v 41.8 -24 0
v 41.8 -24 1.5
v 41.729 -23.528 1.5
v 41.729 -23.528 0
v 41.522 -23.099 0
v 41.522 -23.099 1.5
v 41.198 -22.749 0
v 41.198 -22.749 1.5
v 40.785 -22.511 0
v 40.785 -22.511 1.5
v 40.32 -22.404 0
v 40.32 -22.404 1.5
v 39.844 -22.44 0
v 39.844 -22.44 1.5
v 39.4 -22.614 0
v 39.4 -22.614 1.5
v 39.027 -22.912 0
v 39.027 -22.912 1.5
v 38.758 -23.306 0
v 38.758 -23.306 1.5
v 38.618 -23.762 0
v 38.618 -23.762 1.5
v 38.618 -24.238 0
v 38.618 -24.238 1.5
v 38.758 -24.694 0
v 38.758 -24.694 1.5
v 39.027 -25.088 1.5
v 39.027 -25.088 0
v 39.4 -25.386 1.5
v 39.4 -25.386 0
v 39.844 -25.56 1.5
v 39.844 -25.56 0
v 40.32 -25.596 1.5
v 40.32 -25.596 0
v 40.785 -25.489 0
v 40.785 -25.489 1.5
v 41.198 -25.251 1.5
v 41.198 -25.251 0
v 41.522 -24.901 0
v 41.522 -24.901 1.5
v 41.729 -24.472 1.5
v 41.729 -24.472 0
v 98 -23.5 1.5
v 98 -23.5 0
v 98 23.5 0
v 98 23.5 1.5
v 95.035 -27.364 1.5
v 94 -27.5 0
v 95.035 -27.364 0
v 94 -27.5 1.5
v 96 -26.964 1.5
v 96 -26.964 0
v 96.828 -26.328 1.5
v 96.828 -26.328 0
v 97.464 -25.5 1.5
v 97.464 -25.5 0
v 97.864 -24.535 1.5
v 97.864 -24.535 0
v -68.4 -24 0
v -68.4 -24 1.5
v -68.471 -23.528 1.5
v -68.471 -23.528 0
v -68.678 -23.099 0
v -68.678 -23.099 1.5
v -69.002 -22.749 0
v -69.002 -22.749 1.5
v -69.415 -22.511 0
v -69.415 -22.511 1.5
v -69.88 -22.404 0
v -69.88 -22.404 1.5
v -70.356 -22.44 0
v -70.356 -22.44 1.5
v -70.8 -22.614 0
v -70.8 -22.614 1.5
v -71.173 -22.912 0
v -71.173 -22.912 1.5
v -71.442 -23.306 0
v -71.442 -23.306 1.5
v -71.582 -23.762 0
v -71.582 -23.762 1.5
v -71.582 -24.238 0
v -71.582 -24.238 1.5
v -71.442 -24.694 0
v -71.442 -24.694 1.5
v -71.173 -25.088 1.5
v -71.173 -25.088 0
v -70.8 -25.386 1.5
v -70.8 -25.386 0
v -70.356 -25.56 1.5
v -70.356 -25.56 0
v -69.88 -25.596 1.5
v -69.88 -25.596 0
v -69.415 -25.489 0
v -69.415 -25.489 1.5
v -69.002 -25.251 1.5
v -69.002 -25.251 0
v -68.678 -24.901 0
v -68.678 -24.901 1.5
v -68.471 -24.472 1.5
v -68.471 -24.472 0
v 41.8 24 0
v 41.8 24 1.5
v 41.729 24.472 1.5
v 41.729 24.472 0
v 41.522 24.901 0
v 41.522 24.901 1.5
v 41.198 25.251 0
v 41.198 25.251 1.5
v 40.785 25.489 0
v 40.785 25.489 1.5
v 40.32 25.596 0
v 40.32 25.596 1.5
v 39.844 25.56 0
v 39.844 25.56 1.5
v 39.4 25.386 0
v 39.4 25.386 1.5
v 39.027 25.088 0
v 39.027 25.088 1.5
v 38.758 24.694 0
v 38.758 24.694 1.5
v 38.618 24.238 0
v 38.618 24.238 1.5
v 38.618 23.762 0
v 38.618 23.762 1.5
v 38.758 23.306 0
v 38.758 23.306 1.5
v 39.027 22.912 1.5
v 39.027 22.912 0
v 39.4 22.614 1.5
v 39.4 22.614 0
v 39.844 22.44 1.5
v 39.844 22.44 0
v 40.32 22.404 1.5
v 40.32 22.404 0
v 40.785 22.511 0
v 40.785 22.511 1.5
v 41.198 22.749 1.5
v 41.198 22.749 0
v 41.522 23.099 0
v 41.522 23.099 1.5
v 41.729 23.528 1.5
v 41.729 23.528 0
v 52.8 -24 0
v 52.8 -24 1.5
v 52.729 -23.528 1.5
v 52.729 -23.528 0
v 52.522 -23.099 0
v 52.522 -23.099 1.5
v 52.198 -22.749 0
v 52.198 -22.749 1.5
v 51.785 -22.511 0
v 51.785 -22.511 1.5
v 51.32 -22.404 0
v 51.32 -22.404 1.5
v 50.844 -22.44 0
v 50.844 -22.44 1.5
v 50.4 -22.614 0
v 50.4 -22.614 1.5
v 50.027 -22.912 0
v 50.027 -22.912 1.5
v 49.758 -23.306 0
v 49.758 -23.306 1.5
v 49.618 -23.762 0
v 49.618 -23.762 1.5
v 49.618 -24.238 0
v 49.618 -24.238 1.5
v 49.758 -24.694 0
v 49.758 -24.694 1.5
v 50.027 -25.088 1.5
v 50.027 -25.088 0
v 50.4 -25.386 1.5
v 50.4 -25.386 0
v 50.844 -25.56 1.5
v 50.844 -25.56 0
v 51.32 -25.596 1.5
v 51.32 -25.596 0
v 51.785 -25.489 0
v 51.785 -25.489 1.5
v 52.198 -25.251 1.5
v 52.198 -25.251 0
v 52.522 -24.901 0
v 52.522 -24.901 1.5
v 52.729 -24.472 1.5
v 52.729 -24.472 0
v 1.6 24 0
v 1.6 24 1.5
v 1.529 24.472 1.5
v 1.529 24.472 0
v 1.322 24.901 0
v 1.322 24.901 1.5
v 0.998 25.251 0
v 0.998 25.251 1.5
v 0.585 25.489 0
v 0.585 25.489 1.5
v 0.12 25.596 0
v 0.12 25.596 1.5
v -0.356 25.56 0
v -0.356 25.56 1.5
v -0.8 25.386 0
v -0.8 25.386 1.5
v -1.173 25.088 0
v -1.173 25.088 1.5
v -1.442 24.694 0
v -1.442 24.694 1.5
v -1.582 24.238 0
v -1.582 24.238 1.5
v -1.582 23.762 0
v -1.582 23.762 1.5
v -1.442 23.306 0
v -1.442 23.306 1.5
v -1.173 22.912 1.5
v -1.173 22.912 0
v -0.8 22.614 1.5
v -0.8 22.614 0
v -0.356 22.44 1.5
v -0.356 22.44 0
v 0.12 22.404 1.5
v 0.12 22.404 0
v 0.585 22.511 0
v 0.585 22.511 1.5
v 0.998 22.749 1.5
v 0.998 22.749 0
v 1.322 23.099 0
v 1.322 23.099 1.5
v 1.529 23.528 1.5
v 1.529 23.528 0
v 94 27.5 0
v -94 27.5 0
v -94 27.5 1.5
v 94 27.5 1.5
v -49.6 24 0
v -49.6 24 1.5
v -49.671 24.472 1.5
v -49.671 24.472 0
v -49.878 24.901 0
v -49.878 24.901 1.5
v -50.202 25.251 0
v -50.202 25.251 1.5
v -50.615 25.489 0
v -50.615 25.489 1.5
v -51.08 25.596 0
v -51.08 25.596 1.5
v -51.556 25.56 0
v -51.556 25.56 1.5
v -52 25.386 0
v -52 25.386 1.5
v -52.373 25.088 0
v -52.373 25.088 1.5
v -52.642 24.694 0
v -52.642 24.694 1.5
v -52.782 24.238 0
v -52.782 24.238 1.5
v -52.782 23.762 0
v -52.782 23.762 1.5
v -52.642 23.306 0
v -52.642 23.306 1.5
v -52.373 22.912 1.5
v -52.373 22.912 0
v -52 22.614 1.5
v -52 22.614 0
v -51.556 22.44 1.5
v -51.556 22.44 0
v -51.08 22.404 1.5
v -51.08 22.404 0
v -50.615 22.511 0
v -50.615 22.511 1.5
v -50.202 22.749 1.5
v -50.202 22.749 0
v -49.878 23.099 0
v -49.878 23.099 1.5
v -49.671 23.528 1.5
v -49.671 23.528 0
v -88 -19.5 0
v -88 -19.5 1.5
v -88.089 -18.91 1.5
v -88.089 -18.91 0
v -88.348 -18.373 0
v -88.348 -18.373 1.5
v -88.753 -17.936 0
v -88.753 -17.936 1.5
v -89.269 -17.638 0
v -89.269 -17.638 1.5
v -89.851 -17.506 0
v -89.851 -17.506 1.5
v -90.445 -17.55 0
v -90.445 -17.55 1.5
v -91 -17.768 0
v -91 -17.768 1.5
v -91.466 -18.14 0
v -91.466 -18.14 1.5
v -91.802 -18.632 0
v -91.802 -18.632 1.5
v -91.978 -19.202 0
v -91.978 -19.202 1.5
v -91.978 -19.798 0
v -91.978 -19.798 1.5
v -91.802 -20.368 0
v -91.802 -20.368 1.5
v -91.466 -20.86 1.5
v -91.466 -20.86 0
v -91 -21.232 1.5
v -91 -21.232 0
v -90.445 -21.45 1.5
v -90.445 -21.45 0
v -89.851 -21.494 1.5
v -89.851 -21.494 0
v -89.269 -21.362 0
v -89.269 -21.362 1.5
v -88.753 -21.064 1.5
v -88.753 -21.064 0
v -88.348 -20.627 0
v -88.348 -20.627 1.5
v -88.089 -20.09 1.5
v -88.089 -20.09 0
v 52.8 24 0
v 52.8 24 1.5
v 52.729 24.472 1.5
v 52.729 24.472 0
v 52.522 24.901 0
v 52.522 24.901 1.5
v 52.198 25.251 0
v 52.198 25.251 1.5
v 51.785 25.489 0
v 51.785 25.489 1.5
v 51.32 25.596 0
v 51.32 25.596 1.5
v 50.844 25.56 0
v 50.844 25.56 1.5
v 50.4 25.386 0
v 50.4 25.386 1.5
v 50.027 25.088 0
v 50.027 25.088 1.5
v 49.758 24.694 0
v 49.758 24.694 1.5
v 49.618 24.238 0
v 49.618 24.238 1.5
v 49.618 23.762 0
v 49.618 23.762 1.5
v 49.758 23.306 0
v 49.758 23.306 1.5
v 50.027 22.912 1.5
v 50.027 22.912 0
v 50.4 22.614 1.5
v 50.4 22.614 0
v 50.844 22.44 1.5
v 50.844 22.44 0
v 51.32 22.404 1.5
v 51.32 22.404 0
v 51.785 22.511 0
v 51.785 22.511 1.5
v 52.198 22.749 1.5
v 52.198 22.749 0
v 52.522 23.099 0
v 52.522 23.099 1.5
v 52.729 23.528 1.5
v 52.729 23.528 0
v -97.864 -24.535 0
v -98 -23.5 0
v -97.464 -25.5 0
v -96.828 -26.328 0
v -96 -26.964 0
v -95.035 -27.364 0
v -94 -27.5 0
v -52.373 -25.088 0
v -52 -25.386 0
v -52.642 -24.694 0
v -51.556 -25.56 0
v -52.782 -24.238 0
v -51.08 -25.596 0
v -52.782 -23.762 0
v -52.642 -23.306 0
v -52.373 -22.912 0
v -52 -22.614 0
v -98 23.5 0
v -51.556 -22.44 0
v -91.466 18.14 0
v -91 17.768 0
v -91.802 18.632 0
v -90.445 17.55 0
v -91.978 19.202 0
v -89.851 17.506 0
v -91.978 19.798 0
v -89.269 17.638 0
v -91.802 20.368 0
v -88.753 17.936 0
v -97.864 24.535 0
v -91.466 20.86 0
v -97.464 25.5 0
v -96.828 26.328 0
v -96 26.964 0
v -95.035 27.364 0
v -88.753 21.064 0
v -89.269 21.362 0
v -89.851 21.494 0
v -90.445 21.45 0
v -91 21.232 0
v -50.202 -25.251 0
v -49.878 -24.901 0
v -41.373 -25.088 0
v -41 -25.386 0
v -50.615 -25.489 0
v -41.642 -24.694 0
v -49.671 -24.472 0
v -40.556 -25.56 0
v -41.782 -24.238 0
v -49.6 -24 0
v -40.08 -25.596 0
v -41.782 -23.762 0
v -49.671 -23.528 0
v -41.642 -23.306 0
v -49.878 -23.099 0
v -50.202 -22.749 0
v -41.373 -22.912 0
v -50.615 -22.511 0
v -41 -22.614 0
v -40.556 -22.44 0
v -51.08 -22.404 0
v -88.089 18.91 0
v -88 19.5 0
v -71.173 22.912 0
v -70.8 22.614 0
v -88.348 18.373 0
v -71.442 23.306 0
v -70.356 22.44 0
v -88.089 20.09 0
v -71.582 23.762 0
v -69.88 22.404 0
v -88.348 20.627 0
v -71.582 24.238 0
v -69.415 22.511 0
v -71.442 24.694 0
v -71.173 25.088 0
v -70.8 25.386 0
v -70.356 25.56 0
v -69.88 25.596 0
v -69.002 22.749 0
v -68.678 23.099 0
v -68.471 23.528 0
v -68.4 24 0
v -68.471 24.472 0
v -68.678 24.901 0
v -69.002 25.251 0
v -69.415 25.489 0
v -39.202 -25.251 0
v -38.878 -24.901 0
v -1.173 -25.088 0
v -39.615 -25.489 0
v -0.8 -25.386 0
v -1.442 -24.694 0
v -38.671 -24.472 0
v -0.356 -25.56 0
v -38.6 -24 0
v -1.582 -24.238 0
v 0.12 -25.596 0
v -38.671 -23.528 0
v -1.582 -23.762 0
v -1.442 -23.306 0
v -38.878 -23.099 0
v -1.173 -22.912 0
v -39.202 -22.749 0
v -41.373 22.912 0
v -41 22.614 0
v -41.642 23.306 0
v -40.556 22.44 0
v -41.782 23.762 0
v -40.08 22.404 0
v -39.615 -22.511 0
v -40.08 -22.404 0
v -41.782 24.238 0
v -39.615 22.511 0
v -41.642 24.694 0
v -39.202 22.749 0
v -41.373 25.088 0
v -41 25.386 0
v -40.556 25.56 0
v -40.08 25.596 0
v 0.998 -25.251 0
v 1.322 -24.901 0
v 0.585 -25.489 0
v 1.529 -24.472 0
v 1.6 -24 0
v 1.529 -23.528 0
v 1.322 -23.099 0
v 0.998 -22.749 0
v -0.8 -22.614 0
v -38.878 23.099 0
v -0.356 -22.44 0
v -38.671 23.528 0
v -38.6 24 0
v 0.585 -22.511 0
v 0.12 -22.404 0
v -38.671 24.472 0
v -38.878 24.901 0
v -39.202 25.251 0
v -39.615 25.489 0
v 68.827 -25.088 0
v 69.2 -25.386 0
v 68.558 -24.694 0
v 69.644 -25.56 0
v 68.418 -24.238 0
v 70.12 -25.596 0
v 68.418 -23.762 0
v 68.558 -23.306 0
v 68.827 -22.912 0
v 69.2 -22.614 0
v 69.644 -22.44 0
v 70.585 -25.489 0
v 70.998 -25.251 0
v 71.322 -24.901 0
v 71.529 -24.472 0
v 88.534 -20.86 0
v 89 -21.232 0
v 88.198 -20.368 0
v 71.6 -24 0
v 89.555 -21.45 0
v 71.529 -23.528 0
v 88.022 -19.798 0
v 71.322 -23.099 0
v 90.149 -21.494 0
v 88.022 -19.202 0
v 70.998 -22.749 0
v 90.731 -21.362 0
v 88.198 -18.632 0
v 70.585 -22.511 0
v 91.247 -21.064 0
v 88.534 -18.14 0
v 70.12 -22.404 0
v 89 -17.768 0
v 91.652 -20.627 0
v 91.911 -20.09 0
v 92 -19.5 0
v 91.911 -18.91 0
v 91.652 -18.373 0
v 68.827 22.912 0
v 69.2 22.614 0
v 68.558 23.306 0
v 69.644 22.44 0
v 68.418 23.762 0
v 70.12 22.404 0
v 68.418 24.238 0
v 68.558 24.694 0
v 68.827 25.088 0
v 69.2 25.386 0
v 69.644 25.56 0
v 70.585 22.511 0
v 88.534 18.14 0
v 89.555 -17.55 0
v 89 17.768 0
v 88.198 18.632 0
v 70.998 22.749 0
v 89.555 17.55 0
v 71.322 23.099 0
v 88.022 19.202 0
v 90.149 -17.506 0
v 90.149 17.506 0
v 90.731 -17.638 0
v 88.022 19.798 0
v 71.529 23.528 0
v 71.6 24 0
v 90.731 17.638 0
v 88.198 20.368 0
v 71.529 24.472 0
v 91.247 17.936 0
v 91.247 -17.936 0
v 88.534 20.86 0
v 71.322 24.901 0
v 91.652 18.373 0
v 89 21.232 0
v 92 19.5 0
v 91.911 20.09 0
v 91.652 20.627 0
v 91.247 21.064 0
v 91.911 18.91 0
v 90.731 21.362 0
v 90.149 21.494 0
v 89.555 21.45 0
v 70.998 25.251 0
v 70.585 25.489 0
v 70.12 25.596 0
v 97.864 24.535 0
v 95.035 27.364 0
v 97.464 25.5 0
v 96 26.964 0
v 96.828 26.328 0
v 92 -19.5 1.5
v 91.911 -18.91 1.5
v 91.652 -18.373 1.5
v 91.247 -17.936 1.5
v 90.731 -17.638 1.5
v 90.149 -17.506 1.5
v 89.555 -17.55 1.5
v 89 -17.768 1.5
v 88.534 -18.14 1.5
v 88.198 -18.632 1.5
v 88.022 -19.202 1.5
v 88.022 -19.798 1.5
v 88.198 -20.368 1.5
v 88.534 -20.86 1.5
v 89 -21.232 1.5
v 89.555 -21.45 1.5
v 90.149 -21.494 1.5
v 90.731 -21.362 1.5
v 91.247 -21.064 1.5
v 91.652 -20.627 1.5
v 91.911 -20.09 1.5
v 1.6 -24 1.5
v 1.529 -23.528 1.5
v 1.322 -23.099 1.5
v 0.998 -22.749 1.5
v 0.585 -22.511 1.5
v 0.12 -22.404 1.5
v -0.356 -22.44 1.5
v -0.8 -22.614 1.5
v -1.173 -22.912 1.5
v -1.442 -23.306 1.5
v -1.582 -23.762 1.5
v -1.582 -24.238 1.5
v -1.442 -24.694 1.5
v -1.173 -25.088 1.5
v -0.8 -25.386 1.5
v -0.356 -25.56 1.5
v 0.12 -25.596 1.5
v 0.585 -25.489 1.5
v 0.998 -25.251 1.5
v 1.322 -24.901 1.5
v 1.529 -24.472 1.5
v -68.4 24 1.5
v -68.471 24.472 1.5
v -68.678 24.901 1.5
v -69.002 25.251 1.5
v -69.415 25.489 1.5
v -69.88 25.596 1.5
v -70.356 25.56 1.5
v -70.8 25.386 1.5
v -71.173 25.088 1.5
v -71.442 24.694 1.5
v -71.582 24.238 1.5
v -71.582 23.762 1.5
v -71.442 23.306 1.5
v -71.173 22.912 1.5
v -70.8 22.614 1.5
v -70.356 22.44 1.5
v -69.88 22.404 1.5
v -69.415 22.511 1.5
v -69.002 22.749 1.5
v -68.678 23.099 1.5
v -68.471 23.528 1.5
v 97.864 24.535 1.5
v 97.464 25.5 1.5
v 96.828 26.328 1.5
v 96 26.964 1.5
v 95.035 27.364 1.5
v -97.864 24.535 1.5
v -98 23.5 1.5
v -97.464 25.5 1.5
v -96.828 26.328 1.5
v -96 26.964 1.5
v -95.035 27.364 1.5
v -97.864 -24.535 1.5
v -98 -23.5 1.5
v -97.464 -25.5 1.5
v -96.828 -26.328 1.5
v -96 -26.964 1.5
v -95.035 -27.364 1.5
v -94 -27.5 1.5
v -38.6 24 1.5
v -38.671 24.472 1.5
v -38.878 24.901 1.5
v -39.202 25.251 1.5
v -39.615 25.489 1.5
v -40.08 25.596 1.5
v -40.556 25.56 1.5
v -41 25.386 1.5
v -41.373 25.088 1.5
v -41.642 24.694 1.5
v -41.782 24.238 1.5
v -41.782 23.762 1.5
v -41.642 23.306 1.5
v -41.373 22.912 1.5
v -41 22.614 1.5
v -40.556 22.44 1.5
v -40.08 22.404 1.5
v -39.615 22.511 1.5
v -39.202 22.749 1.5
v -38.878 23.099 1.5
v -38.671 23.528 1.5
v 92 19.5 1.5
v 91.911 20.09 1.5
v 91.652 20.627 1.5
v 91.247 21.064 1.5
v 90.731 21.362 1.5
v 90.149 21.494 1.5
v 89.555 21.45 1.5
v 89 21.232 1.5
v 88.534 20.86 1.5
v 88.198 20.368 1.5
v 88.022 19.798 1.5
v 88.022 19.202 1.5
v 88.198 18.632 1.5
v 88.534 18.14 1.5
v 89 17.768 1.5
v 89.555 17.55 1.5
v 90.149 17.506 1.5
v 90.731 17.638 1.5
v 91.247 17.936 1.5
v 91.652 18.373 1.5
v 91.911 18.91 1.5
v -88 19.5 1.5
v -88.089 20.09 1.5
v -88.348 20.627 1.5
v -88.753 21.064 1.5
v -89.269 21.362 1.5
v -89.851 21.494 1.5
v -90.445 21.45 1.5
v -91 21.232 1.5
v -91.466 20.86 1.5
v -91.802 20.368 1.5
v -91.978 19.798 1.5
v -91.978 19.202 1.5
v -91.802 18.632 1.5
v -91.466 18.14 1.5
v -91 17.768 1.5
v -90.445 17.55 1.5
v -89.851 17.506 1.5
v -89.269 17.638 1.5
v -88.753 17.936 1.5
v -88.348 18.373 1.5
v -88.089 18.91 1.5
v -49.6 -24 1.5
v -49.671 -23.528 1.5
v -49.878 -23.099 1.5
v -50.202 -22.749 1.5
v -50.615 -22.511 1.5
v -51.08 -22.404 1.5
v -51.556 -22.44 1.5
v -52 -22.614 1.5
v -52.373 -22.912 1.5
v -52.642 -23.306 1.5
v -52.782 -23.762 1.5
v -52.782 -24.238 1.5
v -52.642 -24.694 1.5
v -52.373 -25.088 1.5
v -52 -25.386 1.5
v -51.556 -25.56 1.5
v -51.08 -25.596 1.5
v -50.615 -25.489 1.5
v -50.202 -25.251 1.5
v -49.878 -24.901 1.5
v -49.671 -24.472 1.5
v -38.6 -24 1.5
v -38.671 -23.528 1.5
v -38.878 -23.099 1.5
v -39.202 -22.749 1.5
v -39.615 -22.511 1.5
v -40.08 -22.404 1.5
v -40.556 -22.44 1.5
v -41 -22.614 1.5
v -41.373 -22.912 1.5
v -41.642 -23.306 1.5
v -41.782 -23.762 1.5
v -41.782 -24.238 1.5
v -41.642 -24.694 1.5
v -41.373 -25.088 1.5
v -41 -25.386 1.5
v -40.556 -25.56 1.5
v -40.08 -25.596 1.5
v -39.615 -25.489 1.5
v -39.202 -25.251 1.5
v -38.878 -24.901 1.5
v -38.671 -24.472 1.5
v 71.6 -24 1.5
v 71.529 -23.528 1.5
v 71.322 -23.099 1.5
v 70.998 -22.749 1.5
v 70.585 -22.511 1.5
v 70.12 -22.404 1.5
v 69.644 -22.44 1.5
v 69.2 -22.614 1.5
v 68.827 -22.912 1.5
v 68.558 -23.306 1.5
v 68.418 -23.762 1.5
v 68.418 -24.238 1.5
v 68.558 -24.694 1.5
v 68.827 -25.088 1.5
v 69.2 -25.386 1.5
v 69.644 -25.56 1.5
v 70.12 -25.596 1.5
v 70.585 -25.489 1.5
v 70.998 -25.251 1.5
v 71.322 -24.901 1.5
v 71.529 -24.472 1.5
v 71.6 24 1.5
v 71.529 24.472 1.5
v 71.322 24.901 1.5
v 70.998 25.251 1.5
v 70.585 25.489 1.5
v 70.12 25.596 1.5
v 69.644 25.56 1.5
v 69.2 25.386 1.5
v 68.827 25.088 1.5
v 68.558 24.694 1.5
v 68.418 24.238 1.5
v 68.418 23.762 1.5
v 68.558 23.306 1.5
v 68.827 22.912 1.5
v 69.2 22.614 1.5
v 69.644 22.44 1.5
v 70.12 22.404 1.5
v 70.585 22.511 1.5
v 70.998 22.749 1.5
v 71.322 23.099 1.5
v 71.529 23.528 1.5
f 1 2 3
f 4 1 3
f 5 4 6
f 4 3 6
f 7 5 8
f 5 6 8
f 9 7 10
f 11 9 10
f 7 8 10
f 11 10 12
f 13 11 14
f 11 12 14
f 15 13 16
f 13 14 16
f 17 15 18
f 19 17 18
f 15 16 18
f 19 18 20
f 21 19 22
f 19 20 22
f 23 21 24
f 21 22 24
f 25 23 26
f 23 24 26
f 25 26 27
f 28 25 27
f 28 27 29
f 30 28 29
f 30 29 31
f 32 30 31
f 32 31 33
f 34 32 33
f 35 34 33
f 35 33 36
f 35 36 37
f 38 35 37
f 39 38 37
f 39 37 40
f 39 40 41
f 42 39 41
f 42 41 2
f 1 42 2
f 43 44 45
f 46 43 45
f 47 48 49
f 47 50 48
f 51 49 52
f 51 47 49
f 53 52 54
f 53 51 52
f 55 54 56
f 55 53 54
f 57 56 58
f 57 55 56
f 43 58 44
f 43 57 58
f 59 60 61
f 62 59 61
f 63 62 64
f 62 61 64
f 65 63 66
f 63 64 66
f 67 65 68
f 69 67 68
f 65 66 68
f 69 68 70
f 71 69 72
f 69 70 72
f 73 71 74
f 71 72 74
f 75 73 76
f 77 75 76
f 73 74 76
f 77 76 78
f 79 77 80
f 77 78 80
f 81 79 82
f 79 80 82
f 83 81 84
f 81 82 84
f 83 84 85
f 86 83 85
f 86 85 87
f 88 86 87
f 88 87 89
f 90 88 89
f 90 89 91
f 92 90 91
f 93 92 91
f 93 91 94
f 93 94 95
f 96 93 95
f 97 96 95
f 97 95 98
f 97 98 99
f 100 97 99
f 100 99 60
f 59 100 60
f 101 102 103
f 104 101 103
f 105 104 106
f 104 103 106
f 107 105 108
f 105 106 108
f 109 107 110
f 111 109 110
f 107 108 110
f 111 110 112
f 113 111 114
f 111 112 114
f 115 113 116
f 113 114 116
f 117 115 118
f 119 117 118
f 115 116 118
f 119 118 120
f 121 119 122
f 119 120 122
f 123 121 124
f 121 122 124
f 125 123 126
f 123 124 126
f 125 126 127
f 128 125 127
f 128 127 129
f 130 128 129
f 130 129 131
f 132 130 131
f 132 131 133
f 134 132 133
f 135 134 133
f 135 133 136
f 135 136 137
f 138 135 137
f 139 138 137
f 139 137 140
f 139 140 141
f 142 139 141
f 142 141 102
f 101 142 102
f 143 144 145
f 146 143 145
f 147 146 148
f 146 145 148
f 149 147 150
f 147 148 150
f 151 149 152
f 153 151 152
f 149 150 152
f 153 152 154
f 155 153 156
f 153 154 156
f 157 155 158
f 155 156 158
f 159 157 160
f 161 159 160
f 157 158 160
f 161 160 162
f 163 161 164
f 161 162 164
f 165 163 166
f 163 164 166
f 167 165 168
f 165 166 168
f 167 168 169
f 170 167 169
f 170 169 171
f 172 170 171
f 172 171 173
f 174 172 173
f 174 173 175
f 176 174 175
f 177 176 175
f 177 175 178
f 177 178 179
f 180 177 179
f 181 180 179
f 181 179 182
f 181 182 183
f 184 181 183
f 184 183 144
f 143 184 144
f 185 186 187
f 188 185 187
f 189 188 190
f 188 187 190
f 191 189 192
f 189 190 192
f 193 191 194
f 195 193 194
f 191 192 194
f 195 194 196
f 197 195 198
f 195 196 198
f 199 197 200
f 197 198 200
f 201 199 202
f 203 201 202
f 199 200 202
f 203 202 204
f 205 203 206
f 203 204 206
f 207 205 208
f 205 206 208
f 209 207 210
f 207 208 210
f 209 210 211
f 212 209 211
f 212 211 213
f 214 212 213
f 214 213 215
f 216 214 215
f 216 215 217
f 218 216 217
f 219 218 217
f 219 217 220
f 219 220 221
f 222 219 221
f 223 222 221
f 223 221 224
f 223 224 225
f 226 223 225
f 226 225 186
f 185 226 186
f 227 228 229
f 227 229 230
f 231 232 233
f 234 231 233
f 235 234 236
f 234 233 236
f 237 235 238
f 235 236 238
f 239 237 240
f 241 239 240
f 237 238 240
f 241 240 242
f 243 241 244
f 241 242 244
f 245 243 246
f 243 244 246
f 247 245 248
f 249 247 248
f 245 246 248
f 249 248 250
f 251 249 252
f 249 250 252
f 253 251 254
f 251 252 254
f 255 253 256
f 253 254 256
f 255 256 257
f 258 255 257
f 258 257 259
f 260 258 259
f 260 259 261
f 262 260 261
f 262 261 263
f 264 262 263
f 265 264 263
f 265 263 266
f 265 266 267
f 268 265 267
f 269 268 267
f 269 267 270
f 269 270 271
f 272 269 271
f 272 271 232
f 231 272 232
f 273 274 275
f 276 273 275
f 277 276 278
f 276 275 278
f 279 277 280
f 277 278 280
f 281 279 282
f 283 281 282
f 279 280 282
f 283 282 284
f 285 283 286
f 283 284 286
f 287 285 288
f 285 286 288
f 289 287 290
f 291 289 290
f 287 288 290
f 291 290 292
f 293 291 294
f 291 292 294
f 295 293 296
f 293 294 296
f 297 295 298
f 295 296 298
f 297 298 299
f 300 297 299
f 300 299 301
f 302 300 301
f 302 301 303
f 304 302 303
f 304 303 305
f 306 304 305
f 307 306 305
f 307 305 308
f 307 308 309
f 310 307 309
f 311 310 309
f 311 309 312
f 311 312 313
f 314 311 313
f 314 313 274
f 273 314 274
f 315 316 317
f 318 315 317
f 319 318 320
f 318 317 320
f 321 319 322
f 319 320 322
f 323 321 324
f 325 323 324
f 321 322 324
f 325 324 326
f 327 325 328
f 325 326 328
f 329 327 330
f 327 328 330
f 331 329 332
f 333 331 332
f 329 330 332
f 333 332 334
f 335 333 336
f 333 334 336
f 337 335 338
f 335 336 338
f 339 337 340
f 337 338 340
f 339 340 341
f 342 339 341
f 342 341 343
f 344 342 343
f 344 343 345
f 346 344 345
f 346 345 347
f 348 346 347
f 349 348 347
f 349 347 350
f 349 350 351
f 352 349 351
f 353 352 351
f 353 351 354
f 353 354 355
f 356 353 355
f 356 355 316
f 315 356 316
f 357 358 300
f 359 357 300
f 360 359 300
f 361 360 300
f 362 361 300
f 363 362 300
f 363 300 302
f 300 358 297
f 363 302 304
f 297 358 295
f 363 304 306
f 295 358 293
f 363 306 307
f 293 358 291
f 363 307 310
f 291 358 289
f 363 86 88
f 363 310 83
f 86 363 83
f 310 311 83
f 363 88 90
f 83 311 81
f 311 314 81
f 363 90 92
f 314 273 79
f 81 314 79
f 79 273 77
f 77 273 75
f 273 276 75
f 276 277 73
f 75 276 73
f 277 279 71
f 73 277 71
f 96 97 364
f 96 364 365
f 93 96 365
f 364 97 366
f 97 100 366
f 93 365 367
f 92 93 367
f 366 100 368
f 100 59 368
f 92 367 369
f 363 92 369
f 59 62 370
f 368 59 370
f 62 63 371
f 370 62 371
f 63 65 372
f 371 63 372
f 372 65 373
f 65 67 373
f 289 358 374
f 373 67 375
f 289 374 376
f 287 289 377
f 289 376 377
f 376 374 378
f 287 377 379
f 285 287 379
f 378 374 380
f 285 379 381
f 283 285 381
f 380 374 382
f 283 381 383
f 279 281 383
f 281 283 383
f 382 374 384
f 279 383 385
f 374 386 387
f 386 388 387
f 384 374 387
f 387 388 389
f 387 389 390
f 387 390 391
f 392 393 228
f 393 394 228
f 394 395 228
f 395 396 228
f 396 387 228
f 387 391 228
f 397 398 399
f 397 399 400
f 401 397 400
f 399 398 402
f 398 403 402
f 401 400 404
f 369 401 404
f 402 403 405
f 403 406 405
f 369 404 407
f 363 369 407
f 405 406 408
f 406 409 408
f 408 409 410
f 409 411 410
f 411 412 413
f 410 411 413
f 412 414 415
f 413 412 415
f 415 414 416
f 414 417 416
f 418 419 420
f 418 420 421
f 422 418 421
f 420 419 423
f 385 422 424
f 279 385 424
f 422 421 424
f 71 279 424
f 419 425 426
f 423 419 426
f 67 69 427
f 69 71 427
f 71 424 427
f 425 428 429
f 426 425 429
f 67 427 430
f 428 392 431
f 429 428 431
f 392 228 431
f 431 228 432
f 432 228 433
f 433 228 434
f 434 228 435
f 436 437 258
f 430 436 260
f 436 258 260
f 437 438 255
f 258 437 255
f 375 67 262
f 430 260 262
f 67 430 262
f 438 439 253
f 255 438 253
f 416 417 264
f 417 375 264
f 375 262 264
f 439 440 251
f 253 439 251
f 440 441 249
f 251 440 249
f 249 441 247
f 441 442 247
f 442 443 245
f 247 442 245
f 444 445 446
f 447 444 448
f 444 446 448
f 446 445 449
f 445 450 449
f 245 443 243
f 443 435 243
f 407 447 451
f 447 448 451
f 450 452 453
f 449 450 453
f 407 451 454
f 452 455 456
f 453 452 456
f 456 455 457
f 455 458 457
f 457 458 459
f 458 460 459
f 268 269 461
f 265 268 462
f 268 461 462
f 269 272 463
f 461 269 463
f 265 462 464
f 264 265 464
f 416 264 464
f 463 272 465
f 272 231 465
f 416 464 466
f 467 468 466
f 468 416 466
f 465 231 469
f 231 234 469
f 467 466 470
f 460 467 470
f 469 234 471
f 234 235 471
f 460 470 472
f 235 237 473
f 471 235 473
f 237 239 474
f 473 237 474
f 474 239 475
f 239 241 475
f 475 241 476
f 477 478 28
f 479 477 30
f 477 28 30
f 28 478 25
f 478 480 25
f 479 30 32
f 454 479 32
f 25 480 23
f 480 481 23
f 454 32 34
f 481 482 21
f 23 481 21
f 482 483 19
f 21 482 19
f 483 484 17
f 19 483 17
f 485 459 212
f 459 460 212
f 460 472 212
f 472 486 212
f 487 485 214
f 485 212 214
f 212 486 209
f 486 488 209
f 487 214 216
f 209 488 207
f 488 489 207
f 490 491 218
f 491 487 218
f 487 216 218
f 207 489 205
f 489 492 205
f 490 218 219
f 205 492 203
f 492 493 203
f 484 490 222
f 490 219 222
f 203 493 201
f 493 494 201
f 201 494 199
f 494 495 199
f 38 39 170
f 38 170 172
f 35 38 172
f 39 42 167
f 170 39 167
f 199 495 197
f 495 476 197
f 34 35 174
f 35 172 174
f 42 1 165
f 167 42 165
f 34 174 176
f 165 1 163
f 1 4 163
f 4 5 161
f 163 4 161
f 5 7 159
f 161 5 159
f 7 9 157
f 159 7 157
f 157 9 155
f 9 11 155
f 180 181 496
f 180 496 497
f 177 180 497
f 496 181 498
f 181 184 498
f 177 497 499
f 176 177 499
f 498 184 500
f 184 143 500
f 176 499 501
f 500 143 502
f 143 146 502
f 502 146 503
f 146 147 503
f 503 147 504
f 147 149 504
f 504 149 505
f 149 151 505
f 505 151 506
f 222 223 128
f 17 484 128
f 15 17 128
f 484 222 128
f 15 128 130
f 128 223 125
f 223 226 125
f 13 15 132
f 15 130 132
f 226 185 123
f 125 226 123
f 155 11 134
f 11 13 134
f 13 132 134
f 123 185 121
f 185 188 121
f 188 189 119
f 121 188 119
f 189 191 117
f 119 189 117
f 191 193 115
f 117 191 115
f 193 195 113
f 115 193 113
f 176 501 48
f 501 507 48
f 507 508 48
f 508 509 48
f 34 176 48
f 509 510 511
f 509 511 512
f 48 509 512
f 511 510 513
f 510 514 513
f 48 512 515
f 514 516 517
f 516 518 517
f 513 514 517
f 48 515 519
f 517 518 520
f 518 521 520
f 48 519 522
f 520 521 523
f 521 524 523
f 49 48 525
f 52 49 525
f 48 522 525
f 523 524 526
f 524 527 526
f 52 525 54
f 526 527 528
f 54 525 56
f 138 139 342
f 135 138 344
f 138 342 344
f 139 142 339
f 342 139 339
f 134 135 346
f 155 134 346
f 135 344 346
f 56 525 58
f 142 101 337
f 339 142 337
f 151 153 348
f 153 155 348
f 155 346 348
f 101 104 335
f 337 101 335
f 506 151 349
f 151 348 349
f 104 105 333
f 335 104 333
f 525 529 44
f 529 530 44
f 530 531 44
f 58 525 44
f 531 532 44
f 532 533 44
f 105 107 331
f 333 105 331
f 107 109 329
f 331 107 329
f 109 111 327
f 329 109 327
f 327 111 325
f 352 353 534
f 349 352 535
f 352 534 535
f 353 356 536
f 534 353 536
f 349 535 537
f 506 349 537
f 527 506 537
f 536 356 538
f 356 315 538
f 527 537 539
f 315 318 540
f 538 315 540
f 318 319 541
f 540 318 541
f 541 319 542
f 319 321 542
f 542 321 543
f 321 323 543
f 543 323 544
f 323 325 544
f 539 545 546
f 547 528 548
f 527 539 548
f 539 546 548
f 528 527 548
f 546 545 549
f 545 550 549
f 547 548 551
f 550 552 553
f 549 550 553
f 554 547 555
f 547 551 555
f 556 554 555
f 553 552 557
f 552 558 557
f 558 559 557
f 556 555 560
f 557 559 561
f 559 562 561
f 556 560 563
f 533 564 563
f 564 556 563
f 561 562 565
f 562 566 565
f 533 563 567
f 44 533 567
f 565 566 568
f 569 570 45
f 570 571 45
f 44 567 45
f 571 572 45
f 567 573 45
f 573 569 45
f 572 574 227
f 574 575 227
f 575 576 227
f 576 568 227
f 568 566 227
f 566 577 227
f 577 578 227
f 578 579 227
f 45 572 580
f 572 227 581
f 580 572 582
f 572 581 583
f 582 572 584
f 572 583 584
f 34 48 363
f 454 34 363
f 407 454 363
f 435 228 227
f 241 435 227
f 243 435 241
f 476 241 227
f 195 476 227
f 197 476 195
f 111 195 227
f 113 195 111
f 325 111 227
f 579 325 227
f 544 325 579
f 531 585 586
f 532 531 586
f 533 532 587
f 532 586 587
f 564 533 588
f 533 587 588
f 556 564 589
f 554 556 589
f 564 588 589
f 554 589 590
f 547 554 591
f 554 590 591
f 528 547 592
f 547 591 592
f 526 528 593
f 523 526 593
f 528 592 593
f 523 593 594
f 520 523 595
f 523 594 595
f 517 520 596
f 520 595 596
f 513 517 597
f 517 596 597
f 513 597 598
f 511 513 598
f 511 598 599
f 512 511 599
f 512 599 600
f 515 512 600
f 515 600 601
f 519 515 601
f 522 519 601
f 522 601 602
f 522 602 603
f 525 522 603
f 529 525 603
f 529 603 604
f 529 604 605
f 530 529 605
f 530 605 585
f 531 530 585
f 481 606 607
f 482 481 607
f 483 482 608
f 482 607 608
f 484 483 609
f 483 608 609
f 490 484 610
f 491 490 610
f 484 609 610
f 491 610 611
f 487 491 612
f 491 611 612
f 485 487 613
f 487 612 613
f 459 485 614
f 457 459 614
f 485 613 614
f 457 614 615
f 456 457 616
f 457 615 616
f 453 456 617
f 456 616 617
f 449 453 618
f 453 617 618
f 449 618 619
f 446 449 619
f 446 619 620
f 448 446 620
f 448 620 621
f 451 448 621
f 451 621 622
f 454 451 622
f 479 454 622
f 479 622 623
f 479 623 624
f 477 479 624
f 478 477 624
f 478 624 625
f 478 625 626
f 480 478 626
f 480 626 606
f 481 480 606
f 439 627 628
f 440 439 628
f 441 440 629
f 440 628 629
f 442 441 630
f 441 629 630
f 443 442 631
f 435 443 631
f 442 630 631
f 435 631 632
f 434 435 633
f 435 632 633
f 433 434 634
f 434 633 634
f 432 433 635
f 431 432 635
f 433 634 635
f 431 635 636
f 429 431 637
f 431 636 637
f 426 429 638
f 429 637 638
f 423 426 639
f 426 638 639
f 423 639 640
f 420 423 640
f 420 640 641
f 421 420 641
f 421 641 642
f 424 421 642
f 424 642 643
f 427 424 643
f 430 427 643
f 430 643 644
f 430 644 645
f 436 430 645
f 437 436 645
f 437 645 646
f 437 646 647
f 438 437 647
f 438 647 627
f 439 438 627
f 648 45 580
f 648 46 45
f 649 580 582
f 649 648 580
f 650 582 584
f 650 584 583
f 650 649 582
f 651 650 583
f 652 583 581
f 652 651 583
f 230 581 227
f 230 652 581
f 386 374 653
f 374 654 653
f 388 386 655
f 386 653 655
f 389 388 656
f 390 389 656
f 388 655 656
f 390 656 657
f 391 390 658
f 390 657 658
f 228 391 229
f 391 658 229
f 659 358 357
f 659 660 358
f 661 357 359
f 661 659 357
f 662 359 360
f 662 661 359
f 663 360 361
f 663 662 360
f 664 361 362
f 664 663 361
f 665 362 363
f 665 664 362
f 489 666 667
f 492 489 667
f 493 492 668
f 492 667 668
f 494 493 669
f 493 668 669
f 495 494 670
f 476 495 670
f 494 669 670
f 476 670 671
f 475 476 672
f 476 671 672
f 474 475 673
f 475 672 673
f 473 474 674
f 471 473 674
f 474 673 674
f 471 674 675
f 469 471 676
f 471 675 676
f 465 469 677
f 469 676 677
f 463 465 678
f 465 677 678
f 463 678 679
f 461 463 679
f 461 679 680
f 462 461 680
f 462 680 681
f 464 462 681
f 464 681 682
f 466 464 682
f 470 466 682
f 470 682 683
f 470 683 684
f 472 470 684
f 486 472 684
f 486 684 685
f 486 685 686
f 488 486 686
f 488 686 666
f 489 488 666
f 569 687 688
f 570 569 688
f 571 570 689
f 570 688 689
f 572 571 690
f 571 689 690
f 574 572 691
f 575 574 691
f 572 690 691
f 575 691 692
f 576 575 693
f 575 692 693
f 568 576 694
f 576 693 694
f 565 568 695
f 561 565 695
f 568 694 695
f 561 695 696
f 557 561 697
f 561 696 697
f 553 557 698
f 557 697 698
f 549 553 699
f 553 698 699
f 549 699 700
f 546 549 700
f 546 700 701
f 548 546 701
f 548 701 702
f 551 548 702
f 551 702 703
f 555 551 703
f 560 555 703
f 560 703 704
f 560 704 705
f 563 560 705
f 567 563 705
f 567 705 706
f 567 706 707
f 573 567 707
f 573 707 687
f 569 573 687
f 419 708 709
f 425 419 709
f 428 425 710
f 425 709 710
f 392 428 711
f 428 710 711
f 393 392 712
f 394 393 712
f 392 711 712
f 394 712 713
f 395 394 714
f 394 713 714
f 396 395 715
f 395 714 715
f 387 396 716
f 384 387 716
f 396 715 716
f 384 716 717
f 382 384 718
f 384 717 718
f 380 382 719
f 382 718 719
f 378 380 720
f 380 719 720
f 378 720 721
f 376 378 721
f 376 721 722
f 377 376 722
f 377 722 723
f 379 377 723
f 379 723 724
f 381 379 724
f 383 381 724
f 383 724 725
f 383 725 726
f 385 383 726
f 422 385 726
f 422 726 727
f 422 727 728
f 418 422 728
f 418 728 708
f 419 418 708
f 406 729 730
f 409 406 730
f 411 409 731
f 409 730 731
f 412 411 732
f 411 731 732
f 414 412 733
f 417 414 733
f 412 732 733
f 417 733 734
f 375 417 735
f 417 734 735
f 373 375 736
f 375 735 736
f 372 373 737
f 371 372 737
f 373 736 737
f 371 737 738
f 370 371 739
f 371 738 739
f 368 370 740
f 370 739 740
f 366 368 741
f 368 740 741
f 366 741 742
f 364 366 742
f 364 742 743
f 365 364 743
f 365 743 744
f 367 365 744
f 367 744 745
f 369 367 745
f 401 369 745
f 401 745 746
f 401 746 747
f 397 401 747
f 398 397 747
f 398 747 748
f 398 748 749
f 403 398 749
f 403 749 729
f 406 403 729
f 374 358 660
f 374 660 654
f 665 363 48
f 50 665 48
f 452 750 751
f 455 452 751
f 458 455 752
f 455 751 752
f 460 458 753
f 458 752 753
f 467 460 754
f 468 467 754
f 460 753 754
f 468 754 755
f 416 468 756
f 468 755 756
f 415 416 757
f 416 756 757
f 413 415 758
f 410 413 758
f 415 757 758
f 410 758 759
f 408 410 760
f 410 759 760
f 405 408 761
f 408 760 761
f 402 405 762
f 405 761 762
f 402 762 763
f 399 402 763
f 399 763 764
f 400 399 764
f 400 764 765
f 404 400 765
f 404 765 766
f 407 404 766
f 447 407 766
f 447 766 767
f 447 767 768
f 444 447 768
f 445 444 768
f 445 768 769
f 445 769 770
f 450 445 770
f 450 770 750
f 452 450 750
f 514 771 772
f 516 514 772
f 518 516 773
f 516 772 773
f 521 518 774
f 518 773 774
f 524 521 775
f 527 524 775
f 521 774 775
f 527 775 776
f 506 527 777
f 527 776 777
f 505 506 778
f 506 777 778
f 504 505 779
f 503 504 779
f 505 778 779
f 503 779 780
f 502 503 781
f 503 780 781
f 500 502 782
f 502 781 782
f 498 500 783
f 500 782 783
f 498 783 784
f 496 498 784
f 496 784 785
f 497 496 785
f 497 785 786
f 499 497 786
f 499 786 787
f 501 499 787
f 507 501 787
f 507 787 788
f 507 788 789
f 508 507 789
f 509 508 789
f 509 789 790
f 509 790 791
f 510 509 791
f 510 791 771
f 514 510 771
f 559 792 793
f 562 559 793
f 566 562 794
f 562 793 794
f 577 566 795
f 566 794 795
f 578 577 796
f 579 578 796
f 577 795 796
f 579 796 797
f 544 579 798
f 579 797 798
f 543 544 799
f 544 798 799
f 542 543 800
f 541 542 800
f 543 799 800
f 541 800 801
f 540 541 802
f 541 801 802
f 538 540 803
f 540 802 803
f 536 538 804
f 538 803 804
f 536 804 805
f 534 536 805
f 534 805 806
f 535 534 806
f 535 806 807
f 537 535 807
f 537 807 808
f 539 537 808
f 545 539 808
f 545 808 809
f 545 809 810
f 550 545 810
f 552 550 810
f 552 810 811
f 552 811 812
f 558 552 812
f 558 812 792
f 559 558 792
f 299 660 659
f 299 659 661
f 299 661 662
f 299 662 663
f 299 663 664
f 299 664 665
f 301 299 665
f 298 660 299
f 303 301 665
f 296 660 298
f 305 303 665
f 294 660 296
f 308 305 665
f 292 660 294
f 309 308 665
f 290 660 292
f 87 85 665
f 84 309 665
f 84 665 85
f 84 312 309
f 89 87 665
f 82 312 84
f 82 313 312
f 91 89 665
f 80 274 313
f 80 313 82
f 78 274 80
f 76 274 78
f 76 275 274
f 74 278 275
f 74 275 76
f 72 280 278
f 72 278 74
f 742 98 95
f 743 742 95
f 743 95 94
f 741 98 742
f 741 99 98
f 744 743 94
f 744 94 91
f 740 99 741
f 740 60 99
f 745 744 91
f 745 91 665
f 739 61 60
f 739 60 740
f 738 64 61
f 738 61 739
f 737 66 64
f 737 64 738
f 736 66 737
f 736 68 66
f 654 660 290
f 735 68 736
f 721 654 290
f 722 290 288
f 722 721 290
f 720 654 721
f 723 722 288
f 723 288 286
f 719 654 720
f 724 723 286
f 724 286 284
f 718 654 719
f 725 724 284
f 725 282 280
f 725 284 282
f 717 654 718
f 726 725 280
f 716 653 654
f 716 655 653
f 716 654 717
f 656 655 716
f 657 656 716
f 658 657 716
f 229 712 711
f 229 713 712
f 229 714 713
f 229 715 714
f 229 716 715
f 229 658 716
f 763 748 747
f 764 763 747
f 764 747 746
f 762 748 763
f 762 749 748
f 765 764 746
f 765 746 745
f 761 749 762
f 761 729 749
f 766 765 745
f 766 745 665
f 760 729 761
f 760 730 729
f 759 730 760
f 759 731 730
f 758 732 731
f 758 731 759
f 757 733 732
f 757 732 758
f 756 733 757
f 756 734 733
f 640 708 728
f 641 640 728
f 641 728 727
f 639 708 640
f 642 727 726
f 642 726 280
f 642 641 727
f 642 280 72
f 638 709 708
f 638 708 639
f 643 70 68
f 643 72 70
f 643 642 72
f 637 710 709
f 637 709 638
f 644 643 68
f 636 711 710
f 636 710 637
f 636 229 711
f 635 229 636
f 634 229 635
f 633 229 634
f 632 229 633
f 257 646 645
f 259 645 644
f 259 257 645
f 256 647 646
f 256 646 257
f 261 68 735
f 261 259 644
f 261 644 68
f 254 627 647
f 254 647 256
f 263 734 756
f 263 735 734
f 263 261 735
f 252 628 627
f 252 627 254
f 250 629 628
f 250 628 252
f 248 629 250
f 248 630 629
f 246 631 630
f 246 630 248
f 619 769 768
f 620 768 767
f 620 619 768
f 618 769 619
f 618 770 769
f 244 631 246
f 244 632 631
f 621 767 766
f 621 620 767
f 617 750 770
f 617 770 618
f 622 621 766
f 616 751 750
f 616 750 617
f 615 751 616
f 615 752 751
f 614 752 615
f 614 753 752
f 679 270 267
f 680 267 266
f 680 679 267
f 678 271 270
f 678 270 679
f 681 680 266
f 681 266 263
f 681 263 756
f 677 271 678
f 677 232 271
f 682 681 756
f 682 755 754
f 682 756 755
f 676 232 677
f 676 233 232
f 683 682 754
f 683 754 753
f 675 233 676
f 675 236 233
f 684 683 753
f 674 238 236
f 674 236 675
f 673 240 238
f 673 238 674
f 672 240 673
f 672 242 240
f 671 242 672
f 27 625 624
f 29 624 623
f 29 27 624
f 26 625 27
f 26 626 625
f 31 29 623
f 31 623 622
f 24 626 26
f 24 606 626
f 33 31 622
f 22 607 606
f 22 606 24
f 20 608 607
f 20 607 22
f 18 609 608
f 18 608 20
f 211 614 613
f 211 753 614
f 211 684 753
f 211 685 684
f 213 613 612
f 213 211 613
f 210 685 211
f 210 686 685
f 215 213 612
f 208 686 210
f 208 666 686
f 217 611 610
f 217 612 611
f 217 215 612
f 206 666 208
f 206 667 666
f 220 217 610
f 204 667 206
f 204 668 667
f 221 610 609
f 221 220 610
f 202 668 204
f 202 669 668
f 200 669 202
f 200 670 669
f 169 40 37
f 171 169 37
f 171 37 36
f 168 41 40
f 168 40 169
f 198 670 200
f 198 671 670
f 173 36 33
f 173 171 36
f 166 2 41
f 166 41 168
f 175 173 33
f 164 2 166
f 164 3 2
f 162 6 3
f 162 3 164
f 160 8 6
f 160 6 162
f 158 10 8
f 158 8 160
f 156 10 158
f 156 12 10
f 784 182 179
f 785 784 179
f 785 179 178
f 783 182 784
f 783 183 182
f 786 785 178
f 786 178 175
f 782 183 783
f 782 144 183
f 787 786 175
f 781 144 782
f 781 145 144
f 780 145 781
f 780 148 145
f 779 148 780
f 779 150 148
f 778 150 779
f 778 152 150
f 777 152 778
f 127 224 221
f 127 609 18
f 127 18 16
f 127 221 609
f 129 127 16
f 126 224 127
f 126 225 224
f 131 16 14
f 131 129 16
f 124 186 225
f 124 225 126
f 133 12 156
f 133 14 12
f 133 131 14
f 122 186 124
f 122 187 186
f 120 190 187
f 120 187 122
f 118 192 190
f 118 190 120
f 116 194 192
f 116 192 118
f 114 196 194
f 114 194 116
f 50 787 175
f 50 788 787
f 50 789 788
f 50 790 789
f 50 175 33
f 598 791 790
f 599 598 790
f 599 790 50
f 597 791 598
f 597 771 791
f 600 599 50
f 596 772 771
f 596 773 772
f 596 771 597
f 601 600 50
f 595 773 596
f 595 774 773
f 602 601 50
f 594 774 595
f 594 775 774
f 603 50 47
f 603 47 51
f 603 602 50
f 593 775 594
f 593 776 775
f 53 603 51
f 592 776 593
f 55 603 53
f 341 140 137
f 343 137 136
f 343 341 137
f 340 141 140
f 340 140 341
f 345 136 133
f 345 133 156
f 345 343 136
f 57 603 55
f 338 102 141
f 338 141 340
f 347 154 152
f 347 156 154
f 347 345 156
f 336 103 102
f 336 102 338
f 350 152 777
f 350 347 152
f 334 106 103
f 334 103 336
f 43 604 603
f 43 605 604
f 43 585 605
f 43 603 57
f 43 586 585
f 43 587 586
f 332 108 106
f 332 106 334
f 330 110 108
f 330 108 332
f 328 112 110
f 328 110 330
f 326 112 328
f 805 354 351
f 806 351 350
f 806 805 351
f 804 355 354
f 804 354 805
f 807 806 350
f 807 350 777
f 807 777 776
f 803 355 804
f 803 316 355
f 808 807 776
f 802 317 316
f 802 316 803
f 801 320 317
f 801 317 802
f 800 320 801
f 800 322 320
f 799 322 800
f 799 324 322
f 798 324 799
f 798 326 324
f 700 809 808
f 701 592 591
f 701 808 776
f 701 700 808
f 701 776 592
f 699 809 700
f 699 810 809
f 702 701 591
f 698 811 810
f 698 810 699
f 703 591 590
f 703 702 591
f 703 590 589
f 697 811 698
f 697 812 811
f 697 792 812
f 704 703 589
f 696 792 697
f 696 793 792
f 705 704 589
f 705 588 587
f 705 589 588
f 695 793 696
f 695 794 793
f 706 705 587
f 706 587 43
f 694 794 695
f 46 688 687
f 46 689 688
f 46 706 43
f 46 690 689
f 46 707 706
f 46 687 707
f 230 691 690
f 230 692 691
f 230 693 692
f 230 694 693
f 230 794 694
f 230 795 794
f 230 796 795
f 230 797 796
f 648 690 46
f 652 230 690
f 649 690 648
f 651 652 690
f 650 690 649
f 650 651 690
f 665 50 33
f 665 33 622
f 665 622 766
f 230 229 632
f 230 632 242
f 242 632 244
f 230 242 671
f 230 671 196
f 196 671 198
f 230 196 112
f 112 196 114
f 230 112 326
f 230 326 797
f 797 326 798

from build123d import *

# Parameters (mm, degrees)
ESQUISSE1_W             = 196
ESQUISSE1_H             = 55
BOSS_EXTRU_1_DEPTH      = 1.5
CONG_1_R                = 4
ESQUISSE2_R             = 2
ENL_V_MAT_EXTRU_1_DEPTH = 102.796365358
ENL_V_MAT_EXTRU_2_REACH = 103.796
ESQUISSE3_R             = 1.6
ENL_V_MAT_EXTRU_3_REACH = 103.796
ESQUISSE4_R             = 1.6


with BuildPart() as part:
    # Esquisse1 → Boss.-Extru.1 (new body)
    with BuildSketch(Plane.XY):
        Rectangle(ESQUISSE1_W, ESQUISSE1_H)
    extrude(amount=BOSS_EXTRU_1_DEPTH)

    # Congé1
    cong_1_edges = [part.edges().sort_by_distance(p)[0] for p in [
        (-98, 27.5, 0.75),
        (98, 27.5, 0.75),
        (98, -27.5, 0.75),
        (-98, -27.5, 0.75),
    ]]
    fillet(cong_1_edges, radius=CONG_1_R)

    # Esquisse2 → Enlèv. mat.-Extru.1 (cut, through all)
    with BuildSketch(Plane.XY.offset(1.5)):
        with Locations((-90, 19.5)):
            Circle(ESQUISSE2_R)
        with Locations((-90, -19.5)):
            Circle(ESQUISSE2_R)
        with Locations((90, 19.5)):
            Circle(ESQUISSE2_R)
        with Locations((90, -19.5)):
            Circle(ESQUISSE2_R)
    extrude(amount=-ENL_V_MAT_EXTRU_1_DEPTH, mode=Mode.SUBTRACT)

    # Esquisse3 → Enlèv. mat.-Extru.2 (cut, up to next)
    with BuildSketch(Plane.XY.offset(1.5), mode=Mode.PRIVATE) as enl_v_mat_extru_2_sk1:
        with Locations((-51.2, 24)):
            Circle(ESQUISSE3_R)
    enl_v_mat_extru_2_tool1 = extrude(enl_v_mat_extru_2_sk1.sketch, amount=-ENL_V_MAT_EXTRU_2_REACH, mode=Mode.PRIVATE) & part.part
    # Esquisse3 → Enlèv. mat.-Extru.2 (cut, up to next)
    with BuildSketch(Plane.XY.offset(1.5), mode=Mode.PRIVATE) as enl_v_mat_extru_2_sk2:
        with Locations((-40.2, 24)):
            Circle(ESQUISSE3_R)
    enl_v_mat_extru_2_tool2 = extrude(enl_v_mat_extru_2_sk2.sketch, amount=-ENL_V_MAT_EXTRU_2_REACH, mode=Mode.PRIVATE) & part.part
    # Esquisse3 → Enlèv. mat.-Extru.2 (cut, up to next)
    with BuildSketch(Plane.XY.offset(1.5), mode=Mode.PRIVATE) as enl_v_mat_extru_2_sk3:
        with Locations((-40.2, -24)):
            Circle(ESQUISSE3_R)
    enl_v_mat_extru_2_tool3 = extrude(enl_v_mat_extru_2_sk3.sketch, amount=-ENL_V_MAT_EXTRU_2_REACH, mode=Mode.PRIVATE) & part.part
    # Esquisse3 → Enlèv. mat.-Extru.2 (cut, up to next)
    with BuildSketch(Plane.XY.offset(1.5), mode=Mode.PRIVATE) as enl_v_mat_extru_2_sk4:
        with Locations((-51.2, -24)):
            Circle(ESQUISSE3_R)
    enl_v_mat_extru_2_tool4 = extrude(enl_v_mat_extru_2_sk4.sketch, amount=-ENL_V_MAT_EXTRU_2_REACH, mode=Mode.PRIVATE) & part.part
    # Esquisse3 → Enlèv. mat.-Extru.2 (cut, up to next)
    with BuildSketch(Plane.XY.offset(1.5), mode=Mode.PRIVATE) as enl_v_mat_extru_2_sk5:
        with Locations((40.2, -24)):
            Circle(ESQUISSE3_R)
    enl_v_mat_extru_2_tool5 = extrude(enl_v_mat_extru_2_sk5.sketch, amount=-ENL_V_MAT_EXTRU_2_REACH, mode=Mode.PRIVATE) & part.part
    # Esquisse3 → Enlèv. mat.-Extru.2 (cut, up to next)
    with BuildSketch(Plane.XY.offset(1.5), mode=Mode.PRIVATE) as enl_v_mat_extru_2_sk6:
        with Locations((51.2, -24)):
            Circle(ESQUISSE3_R)
    enl_v_mat_extru_2_tool6 = extrude(enl_v_mat_extru_2_sk6.sketch, amount=-ENL_V_MAT_EXTRU_2_REACH, mode=Mode.PRIVATE) & part.part
    # Esquisse3 → Enlèv. mat.-Extru.2 (cut, up to next)
    with BuildSketch(Plane.XY.offset(1.5), mode=Mode.PRIVATE) as enl_v_mat_extru_2_sk7:
        with Locations((51.2, 24)):
            Circle(ESQUISSE3_R)
    enl_v_mat_extru_2_tool7 = extrude(enl_v_mat_extru_2_sk7.sketch, amount=-ENL_V_MAT_EXTRU_2_REACH, mode=Mode.PRIVATE) & part.part
    # Esquisse3 → Enlèv. mat.-Extru.2 (cut, up to next)
    with BuildSketch(Plane.XY.offset(1.5), mode=Mode.PRIVATE) as enl_v_mat_extru_2_sk8:
        with Locations((40.2, 24)):
            Circle(ESQUISSE3_R)
    enl_v_mat_extru_2_tool8 = extrude(enl_v_mat_extru_2_sk8.sketch, amount=-ENL_V_MAT_EXTRU_2_REACH, mode=Mode.PRIVATE) & part.part
    add(enl_v_mat_extru_2_tool1.solids().sort_by_distance((-51.2, 24, 1.5))[0], mode=Mode.SUBTRACT)
    add(enl_v_mat_extru_2_tool2.solids().sort_by_distance((-40.2, 24, 1.5))[0], mode=Mode.SUBTRACT)
    add(enl_v_mat_extru_2_tool3.solids().sort_by_distance((-40.2, -24, 1.5))[0], mode=Mode.SUBTRACT)
    add(enl_v_mat_extru_2_tool4.solids().sort_by_distance((-51.2, -24, 1.5))[0], mode=Mode.SUBTRACT)
    add(enl_v_mat_extru_2_tool5.solids().sort_by_distance((40.2, -24, 1.5))[0], mode=Mode.SUBTRACT)
    add(enl_v_mat_extru_2_tool6.solids().sort_by_distance((51.2, -24, 1.5))[0], mode=Mode.SUBTRACT)
    add(enl_v_mat_extru_2_tool7.solids().sort_by_distance((51.2, 24, 1.5))[0], mode=Mode.SUBTRACT)
    add(enl_v_mat_extru_2_tool8.solids().sort_by_distance((40.2, 24, 1.5))[0], mode=Mode.SUBTRACT)

    # Esquisse4 → Enlèv. mat.-Extru.3 (cut, up to next)
    with BuildSketch(Plane.XY.offset(1.5), mode=Mode.PRIVATE) as enl_v_mat_extru_3_sk1:
        with Locations((-70, 24)):
            Circle(ESQUISSE4_R)
    enl_v_mat_extru_3_tool1 = extrude(enl_v_mat_extru_3_sk1.sketch, amount=-ENL_V_MAT_EXTRU_3_REACH, mode=Mode.PRIVATE) & part.part
    # Esquisse4 → Enlèv. mat.-Extru.3 (cut, up to next)
    with BuildSketch(Plane.XY.offset(1.5), mode=Mode.PRIVATE) as enl_v_mat_extru_3_sk2:
        with Locations((0, 24)):
            Circle(ESQUISSE4_R)
    enl_v_mat_extru_3_tool2 = extrude(enl_v_mat_extru_3_sk2.sketch, amount=-ENL_V_MAT_EXTRU_3_REACH, mode=Mode.PRIVATE) & part.part
    # Esquisse4 → Enlèv. mat.-Extru.3 (cut, up to next)
    with BuildSketch(Plane.XY.offset(1.5), mode=Mode.PRIVATE) as enl_v_mat_extru_3_sk3:
        with Locations((70, 24)):
            Circle(ESQUISSE4_R)
    enl_v_mat_extru_3_tool3 = extrude(enl_v_mat_extru_3_sk3.sketch, amount=-ENL_V_MAT_EXTRU_3_REACH, mode=Mode.PRIVATE) & part.part
    # Esquisse4 → Enlèv. mat.-Extru.3 (cut, up to next)
    with BuildSketch(Plane.XY.offset(1.5), mode=Mode.PRIVATE) as enl_v_mat_extru_3_sk4:
        with Locations((70, -24)):
            Circle(ESQUISSE4_R)
    enl_v_mat_extru_3_tool4 = extrude(enl_v_mat_extru_3_sk4.sketch, amount=-ENL_V_MAT_EXTRU_3_REACH, mode=Mode.PRIVATE) & part.part
    # Esquisse4 → Enlèv. mat.-Extru.3 (cut, up to next)
    with BuildSketch(Plane.XY.offset(1.5), mode=Mode.PRIVATE) as enl_v_mat_extru_3_sk5:
        with Locations((0, -24)):
            Circle(ESQUISSE4_R)
    enl_v_mat_extru_3_tool5 = extrude(enl_v_mat_extru_3_sk5.sketch, amount=-ENL_V_MAT_EXTRU_3_REACH, mode=Mode.PRIVATE) & part.part
    # Esquisse4 → Enlèv. mat.-Extru.3 (cut, up to next)
    with BuildSketch(Plane.XY.offset(1.5), mode=Mode.PRIVATE) as enl_v_mat_extru_3_sk6:
        with Locations((-70, -24)):
            Circle(ESQUISSE4_R)
    enl_v_mat_extru_3_tool6 = extrude(enl_v_mat_extru_3_sk6.sketch, amount=-ENL_V_MAT_EXTRU_3_REACH, mode=Mode.PRIVATE) & part.part
    add(enl_v_mat_extru_3_tool1.solids().sort_by_distance((-70, 24, 1.5))[0], mode=Mode.SUBTRACT)
    add(enl_v_mat_extru_3_tool2.solids().sort_by_distance((0, 24, 1.5))[0], mode=Mode.SUBTRACT)
    add(enl_v_mat_extru_3_tool3.solids().sort_by_distance((70, 24, 1.5))[0], mode=Mode.SUBTRACT)
    add(enl_v_mat_extru_3_tool4.solids().sort_by_distance((70, -24, 1.5))[0], mode=Mode.SUBTRACT)
    add(enl_v_mat_extru_3_tool5.solids().sort_by_distance((0, -24, 1.5))[0], mode=Mode.SUBTRACT)
    add(enl_v_mat_extru_3_tool6.solids().sort_by_distance((-70, -24, 1.5))[0], mode=Mode.SUBTRACT)


solid = part.part
